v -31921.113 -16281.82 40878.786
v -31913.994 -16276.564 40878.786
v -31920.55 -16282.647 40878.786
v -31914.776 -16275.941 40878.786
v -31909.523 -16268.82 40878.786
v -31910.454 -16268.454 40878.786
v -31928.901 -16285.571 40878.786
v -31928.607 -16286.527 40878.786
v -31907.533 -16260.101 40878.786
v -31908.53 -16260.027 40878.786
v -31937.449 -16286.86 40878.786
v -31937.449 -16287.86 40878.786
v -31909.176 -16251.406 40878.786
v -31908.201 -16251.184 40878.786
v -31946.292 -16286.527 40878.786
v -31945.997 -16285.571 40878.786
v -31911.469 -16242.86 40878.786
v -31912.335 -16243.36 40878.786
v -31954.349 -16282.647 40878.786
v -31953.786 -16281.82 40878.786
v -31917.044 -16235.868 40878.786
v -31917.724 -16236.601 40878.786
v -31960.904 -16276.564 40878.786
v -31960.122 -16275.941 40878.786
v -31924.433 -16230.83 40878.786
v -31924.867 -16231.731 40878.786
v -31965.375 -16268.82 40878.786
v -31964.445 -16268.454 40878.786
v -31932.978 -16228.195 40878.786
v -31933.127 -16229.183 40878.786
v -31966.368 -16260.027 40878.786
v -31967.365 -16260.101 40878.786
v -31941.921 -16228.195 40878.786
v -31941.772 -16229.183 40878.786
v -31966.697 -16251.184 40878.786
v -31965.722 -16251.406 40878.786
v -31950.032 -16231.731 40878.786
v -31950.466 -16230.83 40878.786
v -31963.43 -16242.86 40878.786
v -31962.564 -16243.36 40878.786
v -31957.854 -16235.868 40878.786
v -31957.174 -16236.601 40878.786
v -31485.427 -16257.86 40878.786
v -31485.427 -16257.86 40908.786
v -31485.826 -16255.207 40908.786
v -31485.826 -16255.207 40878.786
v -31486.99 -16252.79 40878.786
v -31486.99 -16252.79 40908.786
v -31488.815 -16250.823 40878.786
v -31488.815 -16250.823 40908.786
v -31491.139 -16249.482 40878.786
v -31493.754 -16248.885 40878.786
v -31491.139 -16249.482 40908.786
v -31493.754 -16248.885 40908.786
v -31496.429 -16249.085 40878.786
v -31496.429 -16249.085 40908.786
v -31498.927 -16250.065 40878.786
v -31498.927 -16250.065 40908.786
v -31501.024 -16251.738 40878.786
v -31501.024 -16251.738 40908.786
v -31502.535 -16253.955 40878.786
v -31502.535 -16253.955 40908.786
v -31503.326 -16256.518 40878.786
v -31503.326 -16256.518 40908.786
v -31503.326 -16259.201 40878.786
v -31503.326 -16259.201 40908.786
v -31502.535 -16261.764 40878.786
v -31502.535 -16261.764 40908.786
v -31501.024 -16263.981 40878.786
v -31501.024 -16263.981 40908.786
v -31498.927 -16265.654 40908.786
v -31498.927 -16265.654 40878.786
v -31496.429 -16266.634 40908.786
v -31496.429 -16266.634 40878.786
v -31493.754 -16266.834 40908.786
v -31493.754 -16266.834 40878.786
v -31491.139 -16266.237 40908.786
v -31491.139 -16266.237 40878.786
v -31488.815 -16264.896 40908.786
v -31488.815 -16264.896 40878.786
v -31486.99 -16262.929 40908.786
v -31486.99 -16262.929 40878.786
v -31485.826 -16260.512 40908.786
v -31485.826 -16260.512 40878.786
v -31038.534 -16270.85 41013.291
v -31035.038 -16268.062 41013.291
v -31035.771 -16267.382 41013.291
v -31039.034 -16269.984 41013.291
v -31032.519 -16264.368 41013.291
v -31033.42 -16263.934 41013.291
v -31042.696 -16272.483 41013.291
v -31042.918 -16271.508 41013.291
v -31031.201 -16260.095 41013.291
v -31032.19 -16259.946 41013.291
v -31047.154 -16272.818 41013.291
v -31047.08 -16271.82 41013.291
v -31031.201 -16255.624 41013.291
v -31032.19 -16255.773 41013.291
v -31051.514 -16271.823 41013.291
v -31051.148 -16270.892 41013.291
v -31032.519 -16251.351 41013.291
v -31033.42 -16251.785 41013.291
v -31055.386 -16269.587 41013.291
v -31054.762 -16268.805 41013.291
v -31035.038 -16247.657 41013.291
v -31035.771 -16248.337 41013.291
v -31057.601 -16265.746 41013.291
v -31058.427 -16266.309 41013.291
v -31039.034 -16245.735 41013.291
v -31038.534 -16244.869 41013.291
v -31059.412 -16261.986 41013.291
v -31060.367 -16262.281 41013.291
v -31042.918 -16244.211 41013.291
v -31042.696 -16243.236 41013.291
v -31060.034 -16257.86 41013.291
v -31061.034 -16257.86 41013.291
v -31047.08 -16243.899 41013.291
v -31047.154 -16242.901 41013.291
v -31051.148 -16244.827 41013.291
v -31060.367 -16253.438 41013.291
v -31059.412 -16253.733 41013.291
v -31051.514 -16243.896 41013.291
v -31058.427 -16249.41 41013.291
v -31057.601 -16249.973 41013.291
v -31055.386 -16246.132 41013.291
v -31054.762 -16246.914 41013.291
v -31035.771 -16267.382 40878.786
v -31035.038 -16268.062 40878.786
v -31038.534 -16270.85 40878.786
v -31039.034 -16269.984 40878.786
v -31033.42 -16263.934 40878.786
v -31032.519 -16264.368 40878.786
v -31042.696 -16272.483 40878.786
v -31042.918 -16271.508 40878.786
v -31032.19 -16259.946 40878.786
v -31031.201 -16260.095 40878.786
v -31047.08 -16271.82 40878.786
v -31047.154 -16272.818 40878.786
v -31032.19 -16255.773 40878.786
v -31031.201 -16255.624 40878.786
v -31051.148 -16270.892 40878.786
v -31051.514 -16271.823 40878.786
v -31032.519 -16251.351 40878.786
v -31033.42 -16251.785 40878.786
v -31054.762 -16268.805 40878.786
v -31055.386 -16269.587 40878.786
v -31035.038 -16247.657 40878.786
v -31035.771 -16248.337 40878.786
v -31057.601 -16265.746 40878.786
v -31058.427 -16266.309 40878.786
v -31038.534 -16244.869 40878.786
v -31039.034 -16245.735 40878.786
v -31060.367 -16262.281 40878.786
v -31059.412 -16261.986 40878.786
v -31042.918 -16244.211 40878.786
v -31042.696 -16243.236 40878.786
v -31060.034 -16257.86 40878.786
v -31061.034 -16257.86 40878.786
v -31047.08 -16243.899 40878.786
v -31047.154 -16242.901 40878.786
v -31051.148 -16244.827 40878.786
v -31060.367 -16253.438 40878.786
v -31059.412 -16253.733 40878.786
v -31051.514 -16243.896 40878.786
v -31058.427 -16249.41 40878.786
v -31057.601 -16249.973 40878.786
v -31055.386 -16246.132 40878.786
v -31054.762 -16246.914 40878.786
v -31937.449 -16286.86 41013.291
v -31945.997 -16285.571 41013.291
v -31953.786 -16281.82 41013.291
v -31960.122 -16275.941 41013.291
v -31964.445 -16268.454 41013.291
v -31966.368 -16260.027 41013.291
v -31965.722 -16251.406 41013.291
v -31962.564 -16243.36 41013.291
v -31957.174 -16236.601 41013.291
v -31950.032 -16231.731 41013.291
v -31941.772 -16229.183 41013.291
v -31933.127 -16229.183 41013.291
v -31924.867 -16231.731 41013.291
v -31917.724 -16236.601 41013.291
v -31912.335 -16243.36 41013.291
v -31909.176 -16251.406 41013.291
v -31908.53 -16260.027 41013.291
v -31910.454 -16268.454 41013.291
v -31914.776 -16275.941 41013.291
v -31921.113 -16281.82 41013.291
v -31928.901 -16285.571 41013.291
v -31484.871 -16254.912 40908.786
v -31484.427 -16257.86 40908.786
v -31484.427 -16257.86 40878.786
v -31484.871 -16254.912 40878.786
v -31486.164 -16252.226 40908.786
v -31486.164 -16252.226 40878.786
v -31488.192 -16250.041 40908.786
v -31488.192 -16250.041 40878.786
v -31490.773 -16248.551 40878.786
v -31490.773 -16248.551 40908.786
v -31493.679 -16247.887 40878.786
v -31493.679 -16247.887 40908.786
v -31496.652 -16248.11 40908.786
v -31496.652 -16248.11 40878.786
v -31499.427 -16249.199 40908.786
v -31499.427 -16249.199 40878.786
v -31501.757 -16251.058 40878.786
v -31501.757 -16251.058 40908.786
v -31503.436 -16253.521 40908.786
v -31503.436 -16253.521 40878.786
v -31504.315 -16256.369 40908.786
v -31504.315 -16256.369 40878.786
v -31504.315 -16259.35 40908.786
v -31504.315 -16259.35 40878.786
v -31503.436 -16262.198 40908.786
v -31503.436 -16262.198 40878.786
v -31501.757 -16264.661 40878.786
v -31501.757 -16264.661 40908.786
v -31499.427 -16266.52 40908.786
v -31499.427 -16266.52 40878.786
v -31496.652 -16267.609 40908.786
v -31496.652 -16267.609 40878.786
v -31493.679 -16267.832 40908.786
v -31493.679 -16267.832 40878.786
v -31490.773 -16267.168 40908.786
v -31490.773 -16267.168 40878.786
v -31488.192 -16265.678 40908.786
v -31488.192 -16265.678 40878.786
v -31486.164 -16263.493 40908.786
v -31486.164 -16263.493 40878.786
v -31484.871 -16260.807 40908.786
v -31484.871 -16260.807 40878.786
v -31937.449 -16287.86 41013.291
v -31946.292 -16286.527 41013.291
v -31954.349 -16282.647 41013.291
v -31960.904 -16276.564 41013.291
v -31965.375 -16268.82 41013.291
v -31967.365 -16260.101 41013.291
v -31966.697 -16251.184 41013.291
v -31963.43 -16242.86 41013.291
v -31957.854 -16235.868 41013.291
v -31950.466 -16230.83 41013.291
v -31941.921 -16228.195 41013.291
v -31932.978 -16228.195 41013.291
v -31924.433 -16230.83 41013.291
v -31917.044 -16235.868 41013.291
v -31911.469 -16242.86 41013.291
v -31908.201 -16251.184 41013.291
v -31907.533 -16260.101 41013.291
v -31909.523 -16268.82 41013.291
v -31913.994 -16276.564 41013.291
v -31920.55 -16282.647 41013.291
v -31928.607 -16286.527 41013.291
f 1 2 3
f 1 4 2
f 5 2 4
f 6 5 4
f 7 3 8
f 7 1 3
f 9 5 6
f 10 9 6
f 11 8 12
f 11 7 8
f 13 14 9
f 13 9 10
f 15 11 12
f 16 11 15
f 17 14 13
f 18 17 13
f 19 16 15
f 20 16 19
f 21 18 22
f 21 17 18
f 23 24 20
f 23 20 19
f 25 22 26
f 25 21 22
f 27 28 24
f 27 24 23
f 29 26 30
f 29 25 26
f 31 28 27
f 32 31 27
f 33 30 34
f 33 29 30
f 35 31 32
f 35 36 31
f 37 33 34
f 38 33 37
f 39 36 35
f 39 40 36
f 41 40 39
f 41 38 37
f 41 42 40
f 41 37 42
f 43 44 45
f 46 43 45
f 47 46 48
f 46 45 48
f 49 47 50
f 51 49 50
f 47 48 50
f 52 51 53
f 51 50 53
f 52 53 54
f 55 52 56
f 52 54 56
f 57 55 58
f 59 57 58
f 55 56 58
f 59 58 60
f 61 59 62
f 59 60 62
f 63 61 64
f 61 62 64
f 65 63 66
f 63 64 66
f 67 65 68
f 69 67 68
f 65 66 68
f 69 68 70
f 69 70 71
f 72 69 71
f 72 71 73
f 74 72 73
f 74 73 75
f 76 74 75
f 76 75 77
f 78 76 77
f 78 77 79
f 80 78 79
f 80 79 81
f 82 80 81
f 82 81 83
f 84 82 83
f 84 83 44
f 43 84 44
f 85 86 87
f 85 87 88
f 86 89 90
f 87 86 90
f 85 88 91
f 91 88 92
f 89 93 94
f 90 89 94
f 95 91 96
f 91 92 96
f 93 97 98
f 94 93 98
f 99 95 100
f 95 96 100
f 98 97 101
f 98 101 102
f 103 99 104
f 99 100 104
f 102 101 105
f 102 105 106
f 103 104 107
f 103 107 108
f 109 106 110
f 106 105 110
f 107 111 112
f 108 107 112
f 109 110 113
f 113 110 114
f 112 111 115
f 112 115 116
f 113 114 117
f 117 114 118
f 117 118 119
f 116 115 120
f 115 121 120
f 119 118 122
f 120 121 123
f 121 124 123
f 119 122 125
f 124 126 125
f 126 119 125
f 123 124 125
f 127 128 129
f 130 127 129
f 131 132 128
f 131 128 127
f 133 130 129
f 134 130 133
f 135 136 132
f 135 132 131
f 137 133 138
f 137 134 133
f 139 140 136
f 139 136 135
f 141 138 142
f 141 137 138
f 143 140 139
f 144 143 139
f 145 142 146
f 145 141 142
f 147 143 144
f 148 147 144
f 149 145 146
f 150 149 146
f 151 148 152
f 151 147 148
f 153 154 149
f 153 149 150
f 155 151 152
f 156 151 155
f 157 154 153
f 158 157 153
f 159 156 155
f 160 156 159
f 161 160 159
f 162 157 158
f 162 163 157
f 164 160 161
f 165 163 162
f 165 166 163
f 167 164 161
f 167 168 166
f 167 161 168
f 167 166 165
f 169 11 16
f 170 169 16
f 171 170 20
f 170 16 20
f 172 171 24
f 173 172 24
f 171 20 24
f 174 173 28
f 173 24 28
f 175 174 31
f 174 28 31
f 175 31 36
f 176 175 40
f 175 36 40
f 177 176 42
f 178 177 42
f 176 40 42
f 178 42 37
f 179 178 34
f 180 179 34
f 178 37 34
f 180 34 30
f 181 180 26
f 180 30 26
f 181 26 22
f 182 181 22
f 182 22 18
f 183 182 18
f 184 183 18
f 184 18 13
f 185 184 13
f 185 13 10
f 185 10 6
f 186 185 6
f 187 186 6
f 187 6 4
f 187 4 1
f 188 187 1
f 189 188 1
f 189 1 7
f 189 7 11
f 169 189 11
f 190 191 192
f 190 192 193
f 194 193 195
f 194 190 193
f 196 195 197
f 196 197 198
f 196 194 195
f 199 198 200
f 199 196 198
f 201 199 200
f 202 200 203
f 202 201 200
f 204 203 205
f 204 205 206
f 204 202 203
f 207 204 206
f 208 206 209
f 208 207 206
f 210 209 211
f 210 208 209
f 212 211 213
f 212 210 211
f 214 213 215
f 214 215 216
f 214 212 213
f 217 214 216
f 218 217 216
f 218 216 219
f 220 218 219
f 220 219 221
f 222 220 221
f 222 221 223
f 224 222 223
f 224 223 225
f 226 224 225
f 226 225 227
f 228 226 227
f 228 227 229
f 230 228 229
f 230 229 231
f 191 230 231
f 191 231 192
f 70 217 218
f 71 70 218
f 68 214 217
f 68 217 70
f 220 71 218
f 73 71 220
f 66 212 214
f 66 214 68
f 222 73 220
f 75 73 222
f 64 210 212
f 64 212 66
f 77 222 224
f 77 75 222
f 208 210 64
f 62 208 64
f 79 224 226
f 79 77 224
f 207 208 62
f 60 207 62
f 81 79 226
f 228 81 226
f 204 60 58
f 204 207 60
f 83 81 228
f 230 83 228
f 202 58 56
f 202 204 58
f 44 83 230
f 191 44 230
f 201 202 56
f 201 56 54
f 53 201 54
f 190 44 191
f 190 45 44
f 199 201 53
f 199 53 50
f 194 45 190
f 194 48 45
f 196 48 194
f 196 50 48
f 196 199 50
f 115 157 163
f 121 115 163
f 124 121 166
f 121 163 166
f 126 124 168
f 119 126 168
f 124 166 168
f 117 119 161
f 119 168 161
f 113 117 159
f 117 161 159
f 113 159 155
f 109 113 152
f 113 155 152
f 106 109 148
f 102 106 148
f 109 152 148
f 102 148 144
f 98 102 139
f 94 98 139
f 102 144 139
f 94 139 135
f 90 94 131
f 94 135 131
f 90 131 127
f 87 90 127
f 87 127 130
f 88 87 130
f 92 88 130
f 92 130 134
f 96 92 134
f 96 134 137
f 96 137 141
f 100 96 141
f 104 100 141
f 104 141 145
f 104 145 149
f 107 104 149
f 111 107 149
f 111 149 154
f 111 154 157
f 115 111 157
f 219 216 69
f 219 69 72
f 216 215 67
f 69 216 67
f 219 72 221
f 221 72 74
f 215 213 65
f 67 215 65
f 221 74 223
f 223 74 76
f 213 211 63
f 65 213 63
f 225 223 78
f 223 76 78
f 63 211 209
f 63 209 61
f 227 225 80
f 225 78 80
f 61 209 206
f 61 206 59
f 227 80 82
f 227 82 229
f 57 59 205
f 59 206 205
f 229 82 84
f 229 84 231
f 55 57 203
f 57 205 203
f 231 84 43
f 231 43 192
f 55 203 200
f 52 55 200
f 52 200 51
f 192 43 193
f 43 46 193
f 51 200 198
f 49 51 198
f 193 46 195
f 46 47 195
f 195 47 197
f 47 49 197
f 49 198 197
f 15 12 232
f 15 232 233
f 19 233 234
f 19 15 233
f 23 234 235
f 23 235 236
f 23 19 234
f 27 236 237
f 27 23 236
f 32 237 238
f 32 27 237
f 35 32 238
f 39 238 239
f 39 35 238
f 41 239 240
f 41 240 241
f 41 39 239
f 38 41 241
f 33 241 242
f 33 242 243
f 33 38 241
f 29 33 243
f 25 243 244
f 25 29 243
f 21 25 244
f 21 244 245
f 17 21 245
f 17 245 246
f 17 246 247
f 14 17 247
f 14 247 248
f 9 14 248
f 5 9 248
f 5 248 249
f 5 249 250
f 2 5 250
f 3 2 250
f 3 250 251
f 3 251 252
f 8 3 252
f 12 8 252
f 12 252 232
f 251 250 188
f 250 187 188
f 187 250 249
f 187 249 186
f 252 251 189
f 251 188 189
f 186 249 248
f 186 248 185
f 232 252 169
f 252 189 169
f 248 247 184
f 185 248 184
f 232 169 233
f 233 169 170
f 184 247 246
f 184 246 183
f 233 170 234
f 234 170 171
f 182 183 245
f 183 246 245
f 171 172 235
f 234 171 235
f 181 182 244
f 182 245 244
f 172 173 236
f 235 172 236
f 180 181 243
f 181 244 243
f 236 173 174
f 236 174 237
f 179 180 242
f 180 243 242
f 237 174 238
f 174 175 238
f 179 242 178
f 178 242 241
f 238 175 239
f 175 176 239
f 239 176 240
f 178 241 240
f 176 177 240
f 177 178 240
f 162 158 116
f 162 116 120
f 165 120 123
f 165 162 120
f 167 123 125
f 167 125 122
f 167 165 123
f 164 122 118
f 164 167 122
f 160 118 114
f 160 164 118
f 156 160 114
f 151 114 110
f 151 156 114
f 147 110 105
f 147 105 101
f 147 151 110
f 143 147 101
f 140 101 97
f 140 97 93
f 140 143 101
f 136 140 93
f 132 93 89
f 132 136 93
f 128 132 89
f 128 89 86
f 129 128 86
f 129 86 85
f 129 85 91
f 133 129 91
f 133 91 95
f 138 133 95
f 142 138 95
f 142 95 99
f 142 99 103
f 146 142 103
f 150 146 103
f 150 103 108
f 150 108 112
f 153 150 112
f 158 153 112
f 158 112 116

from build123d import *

# Parameters (mm, degrees)
SWEEP_THIN2_PROFILE_R   = 30
SWEEP_THIN2_PROFILE_R_2 = 29
SWEEP_THIN3_PROFILE_R   = 10
SWEEP_THIN3_PROFILE_R_2 = 9
SWEEP_THIN4_PROFILE_R   = 15
SWEEP_THIN4_PROFILE_R_2 = 14


with BuildPart() as part:
    # Sweep-Thin2: sweep along a curve in space
    with BuildLine() as sweep_thin2_path:
        Line((-31937.449283249, -16257.859506292, 41013.290696056), (-31937.449283249, -16257.859506292, 40878.786131159))
    # Sweep-Thin2 profile (on start of the path) → Sweep-Thin2 (sweep)
    with BuildSketch(Plane(origin=(-31937.449283249, -16257.859506292, 41013.290696056), x_dir=(0, -1, 0), z_dir=(0, 0, -1))):
        Circle(SWEEP_THIN2_PROFILE_R)
        Circle(SWEEP_THIN2_PROFILE_R_2, mode=Mode.SUBTRACT)
    sweep(path=sweep_thin2_path.line)


with BuildPart() as body_2:
    # Sweep-Thin3: sweep along a curve in space
    with BuildLine() as sweep_thin3_path:
        Line((-31494.426581806, -16257.859506292, 40878.786131159), (-31494.426581806, -16257.859506292, 40908.786131159))
    # Sweep-Thin3 profile (on start of the path) → Sweep-Thin3 (sweep)
    with BuildSketch(Plane(origin=(-31494.426581806, -16257.859506292, 40878.786131159), x_dir=(1, 0, 0), z_dir=(0, 0, 1))):
        Circle(SWEEP_THIN3_PROFILE_R)
        Circle(SWEEP_THIN3_PROFILE_R_2, mode=Mode.SUBTRACT)
    sweep(path=sweep_thin3_path.line)


with BuildPart() as body_3:
    # Sweep-Thin4: sweep along a curve in space
    with BuildLine() as sweep_thin4_path:
        Line((-31046.033515707, -16257.859506292, 41013.290696056), (-31046.033515707, -16257.859506292, 40878.786131159))
    # Sweep-Thin4 profile (on start of the path) → Sweep-Thin4 (sweep)
    with BuildSketch(Plane(origin=(-31046.033515707, -16257.859506292, 41013.290696056), x_dir=(-1, 0, 0), z_dir=(0, 0, -1))):
        Circle(SWEEP_THIN4_PROFILE_R)
        Circle(SWEEP_THIN4_PROFILE_R_2, mode=Mode.SUBTRACT)
    sweep(path=sweep_thin4_path.line)


solid = Compound([part.part, body_2.part, body_3.part])
